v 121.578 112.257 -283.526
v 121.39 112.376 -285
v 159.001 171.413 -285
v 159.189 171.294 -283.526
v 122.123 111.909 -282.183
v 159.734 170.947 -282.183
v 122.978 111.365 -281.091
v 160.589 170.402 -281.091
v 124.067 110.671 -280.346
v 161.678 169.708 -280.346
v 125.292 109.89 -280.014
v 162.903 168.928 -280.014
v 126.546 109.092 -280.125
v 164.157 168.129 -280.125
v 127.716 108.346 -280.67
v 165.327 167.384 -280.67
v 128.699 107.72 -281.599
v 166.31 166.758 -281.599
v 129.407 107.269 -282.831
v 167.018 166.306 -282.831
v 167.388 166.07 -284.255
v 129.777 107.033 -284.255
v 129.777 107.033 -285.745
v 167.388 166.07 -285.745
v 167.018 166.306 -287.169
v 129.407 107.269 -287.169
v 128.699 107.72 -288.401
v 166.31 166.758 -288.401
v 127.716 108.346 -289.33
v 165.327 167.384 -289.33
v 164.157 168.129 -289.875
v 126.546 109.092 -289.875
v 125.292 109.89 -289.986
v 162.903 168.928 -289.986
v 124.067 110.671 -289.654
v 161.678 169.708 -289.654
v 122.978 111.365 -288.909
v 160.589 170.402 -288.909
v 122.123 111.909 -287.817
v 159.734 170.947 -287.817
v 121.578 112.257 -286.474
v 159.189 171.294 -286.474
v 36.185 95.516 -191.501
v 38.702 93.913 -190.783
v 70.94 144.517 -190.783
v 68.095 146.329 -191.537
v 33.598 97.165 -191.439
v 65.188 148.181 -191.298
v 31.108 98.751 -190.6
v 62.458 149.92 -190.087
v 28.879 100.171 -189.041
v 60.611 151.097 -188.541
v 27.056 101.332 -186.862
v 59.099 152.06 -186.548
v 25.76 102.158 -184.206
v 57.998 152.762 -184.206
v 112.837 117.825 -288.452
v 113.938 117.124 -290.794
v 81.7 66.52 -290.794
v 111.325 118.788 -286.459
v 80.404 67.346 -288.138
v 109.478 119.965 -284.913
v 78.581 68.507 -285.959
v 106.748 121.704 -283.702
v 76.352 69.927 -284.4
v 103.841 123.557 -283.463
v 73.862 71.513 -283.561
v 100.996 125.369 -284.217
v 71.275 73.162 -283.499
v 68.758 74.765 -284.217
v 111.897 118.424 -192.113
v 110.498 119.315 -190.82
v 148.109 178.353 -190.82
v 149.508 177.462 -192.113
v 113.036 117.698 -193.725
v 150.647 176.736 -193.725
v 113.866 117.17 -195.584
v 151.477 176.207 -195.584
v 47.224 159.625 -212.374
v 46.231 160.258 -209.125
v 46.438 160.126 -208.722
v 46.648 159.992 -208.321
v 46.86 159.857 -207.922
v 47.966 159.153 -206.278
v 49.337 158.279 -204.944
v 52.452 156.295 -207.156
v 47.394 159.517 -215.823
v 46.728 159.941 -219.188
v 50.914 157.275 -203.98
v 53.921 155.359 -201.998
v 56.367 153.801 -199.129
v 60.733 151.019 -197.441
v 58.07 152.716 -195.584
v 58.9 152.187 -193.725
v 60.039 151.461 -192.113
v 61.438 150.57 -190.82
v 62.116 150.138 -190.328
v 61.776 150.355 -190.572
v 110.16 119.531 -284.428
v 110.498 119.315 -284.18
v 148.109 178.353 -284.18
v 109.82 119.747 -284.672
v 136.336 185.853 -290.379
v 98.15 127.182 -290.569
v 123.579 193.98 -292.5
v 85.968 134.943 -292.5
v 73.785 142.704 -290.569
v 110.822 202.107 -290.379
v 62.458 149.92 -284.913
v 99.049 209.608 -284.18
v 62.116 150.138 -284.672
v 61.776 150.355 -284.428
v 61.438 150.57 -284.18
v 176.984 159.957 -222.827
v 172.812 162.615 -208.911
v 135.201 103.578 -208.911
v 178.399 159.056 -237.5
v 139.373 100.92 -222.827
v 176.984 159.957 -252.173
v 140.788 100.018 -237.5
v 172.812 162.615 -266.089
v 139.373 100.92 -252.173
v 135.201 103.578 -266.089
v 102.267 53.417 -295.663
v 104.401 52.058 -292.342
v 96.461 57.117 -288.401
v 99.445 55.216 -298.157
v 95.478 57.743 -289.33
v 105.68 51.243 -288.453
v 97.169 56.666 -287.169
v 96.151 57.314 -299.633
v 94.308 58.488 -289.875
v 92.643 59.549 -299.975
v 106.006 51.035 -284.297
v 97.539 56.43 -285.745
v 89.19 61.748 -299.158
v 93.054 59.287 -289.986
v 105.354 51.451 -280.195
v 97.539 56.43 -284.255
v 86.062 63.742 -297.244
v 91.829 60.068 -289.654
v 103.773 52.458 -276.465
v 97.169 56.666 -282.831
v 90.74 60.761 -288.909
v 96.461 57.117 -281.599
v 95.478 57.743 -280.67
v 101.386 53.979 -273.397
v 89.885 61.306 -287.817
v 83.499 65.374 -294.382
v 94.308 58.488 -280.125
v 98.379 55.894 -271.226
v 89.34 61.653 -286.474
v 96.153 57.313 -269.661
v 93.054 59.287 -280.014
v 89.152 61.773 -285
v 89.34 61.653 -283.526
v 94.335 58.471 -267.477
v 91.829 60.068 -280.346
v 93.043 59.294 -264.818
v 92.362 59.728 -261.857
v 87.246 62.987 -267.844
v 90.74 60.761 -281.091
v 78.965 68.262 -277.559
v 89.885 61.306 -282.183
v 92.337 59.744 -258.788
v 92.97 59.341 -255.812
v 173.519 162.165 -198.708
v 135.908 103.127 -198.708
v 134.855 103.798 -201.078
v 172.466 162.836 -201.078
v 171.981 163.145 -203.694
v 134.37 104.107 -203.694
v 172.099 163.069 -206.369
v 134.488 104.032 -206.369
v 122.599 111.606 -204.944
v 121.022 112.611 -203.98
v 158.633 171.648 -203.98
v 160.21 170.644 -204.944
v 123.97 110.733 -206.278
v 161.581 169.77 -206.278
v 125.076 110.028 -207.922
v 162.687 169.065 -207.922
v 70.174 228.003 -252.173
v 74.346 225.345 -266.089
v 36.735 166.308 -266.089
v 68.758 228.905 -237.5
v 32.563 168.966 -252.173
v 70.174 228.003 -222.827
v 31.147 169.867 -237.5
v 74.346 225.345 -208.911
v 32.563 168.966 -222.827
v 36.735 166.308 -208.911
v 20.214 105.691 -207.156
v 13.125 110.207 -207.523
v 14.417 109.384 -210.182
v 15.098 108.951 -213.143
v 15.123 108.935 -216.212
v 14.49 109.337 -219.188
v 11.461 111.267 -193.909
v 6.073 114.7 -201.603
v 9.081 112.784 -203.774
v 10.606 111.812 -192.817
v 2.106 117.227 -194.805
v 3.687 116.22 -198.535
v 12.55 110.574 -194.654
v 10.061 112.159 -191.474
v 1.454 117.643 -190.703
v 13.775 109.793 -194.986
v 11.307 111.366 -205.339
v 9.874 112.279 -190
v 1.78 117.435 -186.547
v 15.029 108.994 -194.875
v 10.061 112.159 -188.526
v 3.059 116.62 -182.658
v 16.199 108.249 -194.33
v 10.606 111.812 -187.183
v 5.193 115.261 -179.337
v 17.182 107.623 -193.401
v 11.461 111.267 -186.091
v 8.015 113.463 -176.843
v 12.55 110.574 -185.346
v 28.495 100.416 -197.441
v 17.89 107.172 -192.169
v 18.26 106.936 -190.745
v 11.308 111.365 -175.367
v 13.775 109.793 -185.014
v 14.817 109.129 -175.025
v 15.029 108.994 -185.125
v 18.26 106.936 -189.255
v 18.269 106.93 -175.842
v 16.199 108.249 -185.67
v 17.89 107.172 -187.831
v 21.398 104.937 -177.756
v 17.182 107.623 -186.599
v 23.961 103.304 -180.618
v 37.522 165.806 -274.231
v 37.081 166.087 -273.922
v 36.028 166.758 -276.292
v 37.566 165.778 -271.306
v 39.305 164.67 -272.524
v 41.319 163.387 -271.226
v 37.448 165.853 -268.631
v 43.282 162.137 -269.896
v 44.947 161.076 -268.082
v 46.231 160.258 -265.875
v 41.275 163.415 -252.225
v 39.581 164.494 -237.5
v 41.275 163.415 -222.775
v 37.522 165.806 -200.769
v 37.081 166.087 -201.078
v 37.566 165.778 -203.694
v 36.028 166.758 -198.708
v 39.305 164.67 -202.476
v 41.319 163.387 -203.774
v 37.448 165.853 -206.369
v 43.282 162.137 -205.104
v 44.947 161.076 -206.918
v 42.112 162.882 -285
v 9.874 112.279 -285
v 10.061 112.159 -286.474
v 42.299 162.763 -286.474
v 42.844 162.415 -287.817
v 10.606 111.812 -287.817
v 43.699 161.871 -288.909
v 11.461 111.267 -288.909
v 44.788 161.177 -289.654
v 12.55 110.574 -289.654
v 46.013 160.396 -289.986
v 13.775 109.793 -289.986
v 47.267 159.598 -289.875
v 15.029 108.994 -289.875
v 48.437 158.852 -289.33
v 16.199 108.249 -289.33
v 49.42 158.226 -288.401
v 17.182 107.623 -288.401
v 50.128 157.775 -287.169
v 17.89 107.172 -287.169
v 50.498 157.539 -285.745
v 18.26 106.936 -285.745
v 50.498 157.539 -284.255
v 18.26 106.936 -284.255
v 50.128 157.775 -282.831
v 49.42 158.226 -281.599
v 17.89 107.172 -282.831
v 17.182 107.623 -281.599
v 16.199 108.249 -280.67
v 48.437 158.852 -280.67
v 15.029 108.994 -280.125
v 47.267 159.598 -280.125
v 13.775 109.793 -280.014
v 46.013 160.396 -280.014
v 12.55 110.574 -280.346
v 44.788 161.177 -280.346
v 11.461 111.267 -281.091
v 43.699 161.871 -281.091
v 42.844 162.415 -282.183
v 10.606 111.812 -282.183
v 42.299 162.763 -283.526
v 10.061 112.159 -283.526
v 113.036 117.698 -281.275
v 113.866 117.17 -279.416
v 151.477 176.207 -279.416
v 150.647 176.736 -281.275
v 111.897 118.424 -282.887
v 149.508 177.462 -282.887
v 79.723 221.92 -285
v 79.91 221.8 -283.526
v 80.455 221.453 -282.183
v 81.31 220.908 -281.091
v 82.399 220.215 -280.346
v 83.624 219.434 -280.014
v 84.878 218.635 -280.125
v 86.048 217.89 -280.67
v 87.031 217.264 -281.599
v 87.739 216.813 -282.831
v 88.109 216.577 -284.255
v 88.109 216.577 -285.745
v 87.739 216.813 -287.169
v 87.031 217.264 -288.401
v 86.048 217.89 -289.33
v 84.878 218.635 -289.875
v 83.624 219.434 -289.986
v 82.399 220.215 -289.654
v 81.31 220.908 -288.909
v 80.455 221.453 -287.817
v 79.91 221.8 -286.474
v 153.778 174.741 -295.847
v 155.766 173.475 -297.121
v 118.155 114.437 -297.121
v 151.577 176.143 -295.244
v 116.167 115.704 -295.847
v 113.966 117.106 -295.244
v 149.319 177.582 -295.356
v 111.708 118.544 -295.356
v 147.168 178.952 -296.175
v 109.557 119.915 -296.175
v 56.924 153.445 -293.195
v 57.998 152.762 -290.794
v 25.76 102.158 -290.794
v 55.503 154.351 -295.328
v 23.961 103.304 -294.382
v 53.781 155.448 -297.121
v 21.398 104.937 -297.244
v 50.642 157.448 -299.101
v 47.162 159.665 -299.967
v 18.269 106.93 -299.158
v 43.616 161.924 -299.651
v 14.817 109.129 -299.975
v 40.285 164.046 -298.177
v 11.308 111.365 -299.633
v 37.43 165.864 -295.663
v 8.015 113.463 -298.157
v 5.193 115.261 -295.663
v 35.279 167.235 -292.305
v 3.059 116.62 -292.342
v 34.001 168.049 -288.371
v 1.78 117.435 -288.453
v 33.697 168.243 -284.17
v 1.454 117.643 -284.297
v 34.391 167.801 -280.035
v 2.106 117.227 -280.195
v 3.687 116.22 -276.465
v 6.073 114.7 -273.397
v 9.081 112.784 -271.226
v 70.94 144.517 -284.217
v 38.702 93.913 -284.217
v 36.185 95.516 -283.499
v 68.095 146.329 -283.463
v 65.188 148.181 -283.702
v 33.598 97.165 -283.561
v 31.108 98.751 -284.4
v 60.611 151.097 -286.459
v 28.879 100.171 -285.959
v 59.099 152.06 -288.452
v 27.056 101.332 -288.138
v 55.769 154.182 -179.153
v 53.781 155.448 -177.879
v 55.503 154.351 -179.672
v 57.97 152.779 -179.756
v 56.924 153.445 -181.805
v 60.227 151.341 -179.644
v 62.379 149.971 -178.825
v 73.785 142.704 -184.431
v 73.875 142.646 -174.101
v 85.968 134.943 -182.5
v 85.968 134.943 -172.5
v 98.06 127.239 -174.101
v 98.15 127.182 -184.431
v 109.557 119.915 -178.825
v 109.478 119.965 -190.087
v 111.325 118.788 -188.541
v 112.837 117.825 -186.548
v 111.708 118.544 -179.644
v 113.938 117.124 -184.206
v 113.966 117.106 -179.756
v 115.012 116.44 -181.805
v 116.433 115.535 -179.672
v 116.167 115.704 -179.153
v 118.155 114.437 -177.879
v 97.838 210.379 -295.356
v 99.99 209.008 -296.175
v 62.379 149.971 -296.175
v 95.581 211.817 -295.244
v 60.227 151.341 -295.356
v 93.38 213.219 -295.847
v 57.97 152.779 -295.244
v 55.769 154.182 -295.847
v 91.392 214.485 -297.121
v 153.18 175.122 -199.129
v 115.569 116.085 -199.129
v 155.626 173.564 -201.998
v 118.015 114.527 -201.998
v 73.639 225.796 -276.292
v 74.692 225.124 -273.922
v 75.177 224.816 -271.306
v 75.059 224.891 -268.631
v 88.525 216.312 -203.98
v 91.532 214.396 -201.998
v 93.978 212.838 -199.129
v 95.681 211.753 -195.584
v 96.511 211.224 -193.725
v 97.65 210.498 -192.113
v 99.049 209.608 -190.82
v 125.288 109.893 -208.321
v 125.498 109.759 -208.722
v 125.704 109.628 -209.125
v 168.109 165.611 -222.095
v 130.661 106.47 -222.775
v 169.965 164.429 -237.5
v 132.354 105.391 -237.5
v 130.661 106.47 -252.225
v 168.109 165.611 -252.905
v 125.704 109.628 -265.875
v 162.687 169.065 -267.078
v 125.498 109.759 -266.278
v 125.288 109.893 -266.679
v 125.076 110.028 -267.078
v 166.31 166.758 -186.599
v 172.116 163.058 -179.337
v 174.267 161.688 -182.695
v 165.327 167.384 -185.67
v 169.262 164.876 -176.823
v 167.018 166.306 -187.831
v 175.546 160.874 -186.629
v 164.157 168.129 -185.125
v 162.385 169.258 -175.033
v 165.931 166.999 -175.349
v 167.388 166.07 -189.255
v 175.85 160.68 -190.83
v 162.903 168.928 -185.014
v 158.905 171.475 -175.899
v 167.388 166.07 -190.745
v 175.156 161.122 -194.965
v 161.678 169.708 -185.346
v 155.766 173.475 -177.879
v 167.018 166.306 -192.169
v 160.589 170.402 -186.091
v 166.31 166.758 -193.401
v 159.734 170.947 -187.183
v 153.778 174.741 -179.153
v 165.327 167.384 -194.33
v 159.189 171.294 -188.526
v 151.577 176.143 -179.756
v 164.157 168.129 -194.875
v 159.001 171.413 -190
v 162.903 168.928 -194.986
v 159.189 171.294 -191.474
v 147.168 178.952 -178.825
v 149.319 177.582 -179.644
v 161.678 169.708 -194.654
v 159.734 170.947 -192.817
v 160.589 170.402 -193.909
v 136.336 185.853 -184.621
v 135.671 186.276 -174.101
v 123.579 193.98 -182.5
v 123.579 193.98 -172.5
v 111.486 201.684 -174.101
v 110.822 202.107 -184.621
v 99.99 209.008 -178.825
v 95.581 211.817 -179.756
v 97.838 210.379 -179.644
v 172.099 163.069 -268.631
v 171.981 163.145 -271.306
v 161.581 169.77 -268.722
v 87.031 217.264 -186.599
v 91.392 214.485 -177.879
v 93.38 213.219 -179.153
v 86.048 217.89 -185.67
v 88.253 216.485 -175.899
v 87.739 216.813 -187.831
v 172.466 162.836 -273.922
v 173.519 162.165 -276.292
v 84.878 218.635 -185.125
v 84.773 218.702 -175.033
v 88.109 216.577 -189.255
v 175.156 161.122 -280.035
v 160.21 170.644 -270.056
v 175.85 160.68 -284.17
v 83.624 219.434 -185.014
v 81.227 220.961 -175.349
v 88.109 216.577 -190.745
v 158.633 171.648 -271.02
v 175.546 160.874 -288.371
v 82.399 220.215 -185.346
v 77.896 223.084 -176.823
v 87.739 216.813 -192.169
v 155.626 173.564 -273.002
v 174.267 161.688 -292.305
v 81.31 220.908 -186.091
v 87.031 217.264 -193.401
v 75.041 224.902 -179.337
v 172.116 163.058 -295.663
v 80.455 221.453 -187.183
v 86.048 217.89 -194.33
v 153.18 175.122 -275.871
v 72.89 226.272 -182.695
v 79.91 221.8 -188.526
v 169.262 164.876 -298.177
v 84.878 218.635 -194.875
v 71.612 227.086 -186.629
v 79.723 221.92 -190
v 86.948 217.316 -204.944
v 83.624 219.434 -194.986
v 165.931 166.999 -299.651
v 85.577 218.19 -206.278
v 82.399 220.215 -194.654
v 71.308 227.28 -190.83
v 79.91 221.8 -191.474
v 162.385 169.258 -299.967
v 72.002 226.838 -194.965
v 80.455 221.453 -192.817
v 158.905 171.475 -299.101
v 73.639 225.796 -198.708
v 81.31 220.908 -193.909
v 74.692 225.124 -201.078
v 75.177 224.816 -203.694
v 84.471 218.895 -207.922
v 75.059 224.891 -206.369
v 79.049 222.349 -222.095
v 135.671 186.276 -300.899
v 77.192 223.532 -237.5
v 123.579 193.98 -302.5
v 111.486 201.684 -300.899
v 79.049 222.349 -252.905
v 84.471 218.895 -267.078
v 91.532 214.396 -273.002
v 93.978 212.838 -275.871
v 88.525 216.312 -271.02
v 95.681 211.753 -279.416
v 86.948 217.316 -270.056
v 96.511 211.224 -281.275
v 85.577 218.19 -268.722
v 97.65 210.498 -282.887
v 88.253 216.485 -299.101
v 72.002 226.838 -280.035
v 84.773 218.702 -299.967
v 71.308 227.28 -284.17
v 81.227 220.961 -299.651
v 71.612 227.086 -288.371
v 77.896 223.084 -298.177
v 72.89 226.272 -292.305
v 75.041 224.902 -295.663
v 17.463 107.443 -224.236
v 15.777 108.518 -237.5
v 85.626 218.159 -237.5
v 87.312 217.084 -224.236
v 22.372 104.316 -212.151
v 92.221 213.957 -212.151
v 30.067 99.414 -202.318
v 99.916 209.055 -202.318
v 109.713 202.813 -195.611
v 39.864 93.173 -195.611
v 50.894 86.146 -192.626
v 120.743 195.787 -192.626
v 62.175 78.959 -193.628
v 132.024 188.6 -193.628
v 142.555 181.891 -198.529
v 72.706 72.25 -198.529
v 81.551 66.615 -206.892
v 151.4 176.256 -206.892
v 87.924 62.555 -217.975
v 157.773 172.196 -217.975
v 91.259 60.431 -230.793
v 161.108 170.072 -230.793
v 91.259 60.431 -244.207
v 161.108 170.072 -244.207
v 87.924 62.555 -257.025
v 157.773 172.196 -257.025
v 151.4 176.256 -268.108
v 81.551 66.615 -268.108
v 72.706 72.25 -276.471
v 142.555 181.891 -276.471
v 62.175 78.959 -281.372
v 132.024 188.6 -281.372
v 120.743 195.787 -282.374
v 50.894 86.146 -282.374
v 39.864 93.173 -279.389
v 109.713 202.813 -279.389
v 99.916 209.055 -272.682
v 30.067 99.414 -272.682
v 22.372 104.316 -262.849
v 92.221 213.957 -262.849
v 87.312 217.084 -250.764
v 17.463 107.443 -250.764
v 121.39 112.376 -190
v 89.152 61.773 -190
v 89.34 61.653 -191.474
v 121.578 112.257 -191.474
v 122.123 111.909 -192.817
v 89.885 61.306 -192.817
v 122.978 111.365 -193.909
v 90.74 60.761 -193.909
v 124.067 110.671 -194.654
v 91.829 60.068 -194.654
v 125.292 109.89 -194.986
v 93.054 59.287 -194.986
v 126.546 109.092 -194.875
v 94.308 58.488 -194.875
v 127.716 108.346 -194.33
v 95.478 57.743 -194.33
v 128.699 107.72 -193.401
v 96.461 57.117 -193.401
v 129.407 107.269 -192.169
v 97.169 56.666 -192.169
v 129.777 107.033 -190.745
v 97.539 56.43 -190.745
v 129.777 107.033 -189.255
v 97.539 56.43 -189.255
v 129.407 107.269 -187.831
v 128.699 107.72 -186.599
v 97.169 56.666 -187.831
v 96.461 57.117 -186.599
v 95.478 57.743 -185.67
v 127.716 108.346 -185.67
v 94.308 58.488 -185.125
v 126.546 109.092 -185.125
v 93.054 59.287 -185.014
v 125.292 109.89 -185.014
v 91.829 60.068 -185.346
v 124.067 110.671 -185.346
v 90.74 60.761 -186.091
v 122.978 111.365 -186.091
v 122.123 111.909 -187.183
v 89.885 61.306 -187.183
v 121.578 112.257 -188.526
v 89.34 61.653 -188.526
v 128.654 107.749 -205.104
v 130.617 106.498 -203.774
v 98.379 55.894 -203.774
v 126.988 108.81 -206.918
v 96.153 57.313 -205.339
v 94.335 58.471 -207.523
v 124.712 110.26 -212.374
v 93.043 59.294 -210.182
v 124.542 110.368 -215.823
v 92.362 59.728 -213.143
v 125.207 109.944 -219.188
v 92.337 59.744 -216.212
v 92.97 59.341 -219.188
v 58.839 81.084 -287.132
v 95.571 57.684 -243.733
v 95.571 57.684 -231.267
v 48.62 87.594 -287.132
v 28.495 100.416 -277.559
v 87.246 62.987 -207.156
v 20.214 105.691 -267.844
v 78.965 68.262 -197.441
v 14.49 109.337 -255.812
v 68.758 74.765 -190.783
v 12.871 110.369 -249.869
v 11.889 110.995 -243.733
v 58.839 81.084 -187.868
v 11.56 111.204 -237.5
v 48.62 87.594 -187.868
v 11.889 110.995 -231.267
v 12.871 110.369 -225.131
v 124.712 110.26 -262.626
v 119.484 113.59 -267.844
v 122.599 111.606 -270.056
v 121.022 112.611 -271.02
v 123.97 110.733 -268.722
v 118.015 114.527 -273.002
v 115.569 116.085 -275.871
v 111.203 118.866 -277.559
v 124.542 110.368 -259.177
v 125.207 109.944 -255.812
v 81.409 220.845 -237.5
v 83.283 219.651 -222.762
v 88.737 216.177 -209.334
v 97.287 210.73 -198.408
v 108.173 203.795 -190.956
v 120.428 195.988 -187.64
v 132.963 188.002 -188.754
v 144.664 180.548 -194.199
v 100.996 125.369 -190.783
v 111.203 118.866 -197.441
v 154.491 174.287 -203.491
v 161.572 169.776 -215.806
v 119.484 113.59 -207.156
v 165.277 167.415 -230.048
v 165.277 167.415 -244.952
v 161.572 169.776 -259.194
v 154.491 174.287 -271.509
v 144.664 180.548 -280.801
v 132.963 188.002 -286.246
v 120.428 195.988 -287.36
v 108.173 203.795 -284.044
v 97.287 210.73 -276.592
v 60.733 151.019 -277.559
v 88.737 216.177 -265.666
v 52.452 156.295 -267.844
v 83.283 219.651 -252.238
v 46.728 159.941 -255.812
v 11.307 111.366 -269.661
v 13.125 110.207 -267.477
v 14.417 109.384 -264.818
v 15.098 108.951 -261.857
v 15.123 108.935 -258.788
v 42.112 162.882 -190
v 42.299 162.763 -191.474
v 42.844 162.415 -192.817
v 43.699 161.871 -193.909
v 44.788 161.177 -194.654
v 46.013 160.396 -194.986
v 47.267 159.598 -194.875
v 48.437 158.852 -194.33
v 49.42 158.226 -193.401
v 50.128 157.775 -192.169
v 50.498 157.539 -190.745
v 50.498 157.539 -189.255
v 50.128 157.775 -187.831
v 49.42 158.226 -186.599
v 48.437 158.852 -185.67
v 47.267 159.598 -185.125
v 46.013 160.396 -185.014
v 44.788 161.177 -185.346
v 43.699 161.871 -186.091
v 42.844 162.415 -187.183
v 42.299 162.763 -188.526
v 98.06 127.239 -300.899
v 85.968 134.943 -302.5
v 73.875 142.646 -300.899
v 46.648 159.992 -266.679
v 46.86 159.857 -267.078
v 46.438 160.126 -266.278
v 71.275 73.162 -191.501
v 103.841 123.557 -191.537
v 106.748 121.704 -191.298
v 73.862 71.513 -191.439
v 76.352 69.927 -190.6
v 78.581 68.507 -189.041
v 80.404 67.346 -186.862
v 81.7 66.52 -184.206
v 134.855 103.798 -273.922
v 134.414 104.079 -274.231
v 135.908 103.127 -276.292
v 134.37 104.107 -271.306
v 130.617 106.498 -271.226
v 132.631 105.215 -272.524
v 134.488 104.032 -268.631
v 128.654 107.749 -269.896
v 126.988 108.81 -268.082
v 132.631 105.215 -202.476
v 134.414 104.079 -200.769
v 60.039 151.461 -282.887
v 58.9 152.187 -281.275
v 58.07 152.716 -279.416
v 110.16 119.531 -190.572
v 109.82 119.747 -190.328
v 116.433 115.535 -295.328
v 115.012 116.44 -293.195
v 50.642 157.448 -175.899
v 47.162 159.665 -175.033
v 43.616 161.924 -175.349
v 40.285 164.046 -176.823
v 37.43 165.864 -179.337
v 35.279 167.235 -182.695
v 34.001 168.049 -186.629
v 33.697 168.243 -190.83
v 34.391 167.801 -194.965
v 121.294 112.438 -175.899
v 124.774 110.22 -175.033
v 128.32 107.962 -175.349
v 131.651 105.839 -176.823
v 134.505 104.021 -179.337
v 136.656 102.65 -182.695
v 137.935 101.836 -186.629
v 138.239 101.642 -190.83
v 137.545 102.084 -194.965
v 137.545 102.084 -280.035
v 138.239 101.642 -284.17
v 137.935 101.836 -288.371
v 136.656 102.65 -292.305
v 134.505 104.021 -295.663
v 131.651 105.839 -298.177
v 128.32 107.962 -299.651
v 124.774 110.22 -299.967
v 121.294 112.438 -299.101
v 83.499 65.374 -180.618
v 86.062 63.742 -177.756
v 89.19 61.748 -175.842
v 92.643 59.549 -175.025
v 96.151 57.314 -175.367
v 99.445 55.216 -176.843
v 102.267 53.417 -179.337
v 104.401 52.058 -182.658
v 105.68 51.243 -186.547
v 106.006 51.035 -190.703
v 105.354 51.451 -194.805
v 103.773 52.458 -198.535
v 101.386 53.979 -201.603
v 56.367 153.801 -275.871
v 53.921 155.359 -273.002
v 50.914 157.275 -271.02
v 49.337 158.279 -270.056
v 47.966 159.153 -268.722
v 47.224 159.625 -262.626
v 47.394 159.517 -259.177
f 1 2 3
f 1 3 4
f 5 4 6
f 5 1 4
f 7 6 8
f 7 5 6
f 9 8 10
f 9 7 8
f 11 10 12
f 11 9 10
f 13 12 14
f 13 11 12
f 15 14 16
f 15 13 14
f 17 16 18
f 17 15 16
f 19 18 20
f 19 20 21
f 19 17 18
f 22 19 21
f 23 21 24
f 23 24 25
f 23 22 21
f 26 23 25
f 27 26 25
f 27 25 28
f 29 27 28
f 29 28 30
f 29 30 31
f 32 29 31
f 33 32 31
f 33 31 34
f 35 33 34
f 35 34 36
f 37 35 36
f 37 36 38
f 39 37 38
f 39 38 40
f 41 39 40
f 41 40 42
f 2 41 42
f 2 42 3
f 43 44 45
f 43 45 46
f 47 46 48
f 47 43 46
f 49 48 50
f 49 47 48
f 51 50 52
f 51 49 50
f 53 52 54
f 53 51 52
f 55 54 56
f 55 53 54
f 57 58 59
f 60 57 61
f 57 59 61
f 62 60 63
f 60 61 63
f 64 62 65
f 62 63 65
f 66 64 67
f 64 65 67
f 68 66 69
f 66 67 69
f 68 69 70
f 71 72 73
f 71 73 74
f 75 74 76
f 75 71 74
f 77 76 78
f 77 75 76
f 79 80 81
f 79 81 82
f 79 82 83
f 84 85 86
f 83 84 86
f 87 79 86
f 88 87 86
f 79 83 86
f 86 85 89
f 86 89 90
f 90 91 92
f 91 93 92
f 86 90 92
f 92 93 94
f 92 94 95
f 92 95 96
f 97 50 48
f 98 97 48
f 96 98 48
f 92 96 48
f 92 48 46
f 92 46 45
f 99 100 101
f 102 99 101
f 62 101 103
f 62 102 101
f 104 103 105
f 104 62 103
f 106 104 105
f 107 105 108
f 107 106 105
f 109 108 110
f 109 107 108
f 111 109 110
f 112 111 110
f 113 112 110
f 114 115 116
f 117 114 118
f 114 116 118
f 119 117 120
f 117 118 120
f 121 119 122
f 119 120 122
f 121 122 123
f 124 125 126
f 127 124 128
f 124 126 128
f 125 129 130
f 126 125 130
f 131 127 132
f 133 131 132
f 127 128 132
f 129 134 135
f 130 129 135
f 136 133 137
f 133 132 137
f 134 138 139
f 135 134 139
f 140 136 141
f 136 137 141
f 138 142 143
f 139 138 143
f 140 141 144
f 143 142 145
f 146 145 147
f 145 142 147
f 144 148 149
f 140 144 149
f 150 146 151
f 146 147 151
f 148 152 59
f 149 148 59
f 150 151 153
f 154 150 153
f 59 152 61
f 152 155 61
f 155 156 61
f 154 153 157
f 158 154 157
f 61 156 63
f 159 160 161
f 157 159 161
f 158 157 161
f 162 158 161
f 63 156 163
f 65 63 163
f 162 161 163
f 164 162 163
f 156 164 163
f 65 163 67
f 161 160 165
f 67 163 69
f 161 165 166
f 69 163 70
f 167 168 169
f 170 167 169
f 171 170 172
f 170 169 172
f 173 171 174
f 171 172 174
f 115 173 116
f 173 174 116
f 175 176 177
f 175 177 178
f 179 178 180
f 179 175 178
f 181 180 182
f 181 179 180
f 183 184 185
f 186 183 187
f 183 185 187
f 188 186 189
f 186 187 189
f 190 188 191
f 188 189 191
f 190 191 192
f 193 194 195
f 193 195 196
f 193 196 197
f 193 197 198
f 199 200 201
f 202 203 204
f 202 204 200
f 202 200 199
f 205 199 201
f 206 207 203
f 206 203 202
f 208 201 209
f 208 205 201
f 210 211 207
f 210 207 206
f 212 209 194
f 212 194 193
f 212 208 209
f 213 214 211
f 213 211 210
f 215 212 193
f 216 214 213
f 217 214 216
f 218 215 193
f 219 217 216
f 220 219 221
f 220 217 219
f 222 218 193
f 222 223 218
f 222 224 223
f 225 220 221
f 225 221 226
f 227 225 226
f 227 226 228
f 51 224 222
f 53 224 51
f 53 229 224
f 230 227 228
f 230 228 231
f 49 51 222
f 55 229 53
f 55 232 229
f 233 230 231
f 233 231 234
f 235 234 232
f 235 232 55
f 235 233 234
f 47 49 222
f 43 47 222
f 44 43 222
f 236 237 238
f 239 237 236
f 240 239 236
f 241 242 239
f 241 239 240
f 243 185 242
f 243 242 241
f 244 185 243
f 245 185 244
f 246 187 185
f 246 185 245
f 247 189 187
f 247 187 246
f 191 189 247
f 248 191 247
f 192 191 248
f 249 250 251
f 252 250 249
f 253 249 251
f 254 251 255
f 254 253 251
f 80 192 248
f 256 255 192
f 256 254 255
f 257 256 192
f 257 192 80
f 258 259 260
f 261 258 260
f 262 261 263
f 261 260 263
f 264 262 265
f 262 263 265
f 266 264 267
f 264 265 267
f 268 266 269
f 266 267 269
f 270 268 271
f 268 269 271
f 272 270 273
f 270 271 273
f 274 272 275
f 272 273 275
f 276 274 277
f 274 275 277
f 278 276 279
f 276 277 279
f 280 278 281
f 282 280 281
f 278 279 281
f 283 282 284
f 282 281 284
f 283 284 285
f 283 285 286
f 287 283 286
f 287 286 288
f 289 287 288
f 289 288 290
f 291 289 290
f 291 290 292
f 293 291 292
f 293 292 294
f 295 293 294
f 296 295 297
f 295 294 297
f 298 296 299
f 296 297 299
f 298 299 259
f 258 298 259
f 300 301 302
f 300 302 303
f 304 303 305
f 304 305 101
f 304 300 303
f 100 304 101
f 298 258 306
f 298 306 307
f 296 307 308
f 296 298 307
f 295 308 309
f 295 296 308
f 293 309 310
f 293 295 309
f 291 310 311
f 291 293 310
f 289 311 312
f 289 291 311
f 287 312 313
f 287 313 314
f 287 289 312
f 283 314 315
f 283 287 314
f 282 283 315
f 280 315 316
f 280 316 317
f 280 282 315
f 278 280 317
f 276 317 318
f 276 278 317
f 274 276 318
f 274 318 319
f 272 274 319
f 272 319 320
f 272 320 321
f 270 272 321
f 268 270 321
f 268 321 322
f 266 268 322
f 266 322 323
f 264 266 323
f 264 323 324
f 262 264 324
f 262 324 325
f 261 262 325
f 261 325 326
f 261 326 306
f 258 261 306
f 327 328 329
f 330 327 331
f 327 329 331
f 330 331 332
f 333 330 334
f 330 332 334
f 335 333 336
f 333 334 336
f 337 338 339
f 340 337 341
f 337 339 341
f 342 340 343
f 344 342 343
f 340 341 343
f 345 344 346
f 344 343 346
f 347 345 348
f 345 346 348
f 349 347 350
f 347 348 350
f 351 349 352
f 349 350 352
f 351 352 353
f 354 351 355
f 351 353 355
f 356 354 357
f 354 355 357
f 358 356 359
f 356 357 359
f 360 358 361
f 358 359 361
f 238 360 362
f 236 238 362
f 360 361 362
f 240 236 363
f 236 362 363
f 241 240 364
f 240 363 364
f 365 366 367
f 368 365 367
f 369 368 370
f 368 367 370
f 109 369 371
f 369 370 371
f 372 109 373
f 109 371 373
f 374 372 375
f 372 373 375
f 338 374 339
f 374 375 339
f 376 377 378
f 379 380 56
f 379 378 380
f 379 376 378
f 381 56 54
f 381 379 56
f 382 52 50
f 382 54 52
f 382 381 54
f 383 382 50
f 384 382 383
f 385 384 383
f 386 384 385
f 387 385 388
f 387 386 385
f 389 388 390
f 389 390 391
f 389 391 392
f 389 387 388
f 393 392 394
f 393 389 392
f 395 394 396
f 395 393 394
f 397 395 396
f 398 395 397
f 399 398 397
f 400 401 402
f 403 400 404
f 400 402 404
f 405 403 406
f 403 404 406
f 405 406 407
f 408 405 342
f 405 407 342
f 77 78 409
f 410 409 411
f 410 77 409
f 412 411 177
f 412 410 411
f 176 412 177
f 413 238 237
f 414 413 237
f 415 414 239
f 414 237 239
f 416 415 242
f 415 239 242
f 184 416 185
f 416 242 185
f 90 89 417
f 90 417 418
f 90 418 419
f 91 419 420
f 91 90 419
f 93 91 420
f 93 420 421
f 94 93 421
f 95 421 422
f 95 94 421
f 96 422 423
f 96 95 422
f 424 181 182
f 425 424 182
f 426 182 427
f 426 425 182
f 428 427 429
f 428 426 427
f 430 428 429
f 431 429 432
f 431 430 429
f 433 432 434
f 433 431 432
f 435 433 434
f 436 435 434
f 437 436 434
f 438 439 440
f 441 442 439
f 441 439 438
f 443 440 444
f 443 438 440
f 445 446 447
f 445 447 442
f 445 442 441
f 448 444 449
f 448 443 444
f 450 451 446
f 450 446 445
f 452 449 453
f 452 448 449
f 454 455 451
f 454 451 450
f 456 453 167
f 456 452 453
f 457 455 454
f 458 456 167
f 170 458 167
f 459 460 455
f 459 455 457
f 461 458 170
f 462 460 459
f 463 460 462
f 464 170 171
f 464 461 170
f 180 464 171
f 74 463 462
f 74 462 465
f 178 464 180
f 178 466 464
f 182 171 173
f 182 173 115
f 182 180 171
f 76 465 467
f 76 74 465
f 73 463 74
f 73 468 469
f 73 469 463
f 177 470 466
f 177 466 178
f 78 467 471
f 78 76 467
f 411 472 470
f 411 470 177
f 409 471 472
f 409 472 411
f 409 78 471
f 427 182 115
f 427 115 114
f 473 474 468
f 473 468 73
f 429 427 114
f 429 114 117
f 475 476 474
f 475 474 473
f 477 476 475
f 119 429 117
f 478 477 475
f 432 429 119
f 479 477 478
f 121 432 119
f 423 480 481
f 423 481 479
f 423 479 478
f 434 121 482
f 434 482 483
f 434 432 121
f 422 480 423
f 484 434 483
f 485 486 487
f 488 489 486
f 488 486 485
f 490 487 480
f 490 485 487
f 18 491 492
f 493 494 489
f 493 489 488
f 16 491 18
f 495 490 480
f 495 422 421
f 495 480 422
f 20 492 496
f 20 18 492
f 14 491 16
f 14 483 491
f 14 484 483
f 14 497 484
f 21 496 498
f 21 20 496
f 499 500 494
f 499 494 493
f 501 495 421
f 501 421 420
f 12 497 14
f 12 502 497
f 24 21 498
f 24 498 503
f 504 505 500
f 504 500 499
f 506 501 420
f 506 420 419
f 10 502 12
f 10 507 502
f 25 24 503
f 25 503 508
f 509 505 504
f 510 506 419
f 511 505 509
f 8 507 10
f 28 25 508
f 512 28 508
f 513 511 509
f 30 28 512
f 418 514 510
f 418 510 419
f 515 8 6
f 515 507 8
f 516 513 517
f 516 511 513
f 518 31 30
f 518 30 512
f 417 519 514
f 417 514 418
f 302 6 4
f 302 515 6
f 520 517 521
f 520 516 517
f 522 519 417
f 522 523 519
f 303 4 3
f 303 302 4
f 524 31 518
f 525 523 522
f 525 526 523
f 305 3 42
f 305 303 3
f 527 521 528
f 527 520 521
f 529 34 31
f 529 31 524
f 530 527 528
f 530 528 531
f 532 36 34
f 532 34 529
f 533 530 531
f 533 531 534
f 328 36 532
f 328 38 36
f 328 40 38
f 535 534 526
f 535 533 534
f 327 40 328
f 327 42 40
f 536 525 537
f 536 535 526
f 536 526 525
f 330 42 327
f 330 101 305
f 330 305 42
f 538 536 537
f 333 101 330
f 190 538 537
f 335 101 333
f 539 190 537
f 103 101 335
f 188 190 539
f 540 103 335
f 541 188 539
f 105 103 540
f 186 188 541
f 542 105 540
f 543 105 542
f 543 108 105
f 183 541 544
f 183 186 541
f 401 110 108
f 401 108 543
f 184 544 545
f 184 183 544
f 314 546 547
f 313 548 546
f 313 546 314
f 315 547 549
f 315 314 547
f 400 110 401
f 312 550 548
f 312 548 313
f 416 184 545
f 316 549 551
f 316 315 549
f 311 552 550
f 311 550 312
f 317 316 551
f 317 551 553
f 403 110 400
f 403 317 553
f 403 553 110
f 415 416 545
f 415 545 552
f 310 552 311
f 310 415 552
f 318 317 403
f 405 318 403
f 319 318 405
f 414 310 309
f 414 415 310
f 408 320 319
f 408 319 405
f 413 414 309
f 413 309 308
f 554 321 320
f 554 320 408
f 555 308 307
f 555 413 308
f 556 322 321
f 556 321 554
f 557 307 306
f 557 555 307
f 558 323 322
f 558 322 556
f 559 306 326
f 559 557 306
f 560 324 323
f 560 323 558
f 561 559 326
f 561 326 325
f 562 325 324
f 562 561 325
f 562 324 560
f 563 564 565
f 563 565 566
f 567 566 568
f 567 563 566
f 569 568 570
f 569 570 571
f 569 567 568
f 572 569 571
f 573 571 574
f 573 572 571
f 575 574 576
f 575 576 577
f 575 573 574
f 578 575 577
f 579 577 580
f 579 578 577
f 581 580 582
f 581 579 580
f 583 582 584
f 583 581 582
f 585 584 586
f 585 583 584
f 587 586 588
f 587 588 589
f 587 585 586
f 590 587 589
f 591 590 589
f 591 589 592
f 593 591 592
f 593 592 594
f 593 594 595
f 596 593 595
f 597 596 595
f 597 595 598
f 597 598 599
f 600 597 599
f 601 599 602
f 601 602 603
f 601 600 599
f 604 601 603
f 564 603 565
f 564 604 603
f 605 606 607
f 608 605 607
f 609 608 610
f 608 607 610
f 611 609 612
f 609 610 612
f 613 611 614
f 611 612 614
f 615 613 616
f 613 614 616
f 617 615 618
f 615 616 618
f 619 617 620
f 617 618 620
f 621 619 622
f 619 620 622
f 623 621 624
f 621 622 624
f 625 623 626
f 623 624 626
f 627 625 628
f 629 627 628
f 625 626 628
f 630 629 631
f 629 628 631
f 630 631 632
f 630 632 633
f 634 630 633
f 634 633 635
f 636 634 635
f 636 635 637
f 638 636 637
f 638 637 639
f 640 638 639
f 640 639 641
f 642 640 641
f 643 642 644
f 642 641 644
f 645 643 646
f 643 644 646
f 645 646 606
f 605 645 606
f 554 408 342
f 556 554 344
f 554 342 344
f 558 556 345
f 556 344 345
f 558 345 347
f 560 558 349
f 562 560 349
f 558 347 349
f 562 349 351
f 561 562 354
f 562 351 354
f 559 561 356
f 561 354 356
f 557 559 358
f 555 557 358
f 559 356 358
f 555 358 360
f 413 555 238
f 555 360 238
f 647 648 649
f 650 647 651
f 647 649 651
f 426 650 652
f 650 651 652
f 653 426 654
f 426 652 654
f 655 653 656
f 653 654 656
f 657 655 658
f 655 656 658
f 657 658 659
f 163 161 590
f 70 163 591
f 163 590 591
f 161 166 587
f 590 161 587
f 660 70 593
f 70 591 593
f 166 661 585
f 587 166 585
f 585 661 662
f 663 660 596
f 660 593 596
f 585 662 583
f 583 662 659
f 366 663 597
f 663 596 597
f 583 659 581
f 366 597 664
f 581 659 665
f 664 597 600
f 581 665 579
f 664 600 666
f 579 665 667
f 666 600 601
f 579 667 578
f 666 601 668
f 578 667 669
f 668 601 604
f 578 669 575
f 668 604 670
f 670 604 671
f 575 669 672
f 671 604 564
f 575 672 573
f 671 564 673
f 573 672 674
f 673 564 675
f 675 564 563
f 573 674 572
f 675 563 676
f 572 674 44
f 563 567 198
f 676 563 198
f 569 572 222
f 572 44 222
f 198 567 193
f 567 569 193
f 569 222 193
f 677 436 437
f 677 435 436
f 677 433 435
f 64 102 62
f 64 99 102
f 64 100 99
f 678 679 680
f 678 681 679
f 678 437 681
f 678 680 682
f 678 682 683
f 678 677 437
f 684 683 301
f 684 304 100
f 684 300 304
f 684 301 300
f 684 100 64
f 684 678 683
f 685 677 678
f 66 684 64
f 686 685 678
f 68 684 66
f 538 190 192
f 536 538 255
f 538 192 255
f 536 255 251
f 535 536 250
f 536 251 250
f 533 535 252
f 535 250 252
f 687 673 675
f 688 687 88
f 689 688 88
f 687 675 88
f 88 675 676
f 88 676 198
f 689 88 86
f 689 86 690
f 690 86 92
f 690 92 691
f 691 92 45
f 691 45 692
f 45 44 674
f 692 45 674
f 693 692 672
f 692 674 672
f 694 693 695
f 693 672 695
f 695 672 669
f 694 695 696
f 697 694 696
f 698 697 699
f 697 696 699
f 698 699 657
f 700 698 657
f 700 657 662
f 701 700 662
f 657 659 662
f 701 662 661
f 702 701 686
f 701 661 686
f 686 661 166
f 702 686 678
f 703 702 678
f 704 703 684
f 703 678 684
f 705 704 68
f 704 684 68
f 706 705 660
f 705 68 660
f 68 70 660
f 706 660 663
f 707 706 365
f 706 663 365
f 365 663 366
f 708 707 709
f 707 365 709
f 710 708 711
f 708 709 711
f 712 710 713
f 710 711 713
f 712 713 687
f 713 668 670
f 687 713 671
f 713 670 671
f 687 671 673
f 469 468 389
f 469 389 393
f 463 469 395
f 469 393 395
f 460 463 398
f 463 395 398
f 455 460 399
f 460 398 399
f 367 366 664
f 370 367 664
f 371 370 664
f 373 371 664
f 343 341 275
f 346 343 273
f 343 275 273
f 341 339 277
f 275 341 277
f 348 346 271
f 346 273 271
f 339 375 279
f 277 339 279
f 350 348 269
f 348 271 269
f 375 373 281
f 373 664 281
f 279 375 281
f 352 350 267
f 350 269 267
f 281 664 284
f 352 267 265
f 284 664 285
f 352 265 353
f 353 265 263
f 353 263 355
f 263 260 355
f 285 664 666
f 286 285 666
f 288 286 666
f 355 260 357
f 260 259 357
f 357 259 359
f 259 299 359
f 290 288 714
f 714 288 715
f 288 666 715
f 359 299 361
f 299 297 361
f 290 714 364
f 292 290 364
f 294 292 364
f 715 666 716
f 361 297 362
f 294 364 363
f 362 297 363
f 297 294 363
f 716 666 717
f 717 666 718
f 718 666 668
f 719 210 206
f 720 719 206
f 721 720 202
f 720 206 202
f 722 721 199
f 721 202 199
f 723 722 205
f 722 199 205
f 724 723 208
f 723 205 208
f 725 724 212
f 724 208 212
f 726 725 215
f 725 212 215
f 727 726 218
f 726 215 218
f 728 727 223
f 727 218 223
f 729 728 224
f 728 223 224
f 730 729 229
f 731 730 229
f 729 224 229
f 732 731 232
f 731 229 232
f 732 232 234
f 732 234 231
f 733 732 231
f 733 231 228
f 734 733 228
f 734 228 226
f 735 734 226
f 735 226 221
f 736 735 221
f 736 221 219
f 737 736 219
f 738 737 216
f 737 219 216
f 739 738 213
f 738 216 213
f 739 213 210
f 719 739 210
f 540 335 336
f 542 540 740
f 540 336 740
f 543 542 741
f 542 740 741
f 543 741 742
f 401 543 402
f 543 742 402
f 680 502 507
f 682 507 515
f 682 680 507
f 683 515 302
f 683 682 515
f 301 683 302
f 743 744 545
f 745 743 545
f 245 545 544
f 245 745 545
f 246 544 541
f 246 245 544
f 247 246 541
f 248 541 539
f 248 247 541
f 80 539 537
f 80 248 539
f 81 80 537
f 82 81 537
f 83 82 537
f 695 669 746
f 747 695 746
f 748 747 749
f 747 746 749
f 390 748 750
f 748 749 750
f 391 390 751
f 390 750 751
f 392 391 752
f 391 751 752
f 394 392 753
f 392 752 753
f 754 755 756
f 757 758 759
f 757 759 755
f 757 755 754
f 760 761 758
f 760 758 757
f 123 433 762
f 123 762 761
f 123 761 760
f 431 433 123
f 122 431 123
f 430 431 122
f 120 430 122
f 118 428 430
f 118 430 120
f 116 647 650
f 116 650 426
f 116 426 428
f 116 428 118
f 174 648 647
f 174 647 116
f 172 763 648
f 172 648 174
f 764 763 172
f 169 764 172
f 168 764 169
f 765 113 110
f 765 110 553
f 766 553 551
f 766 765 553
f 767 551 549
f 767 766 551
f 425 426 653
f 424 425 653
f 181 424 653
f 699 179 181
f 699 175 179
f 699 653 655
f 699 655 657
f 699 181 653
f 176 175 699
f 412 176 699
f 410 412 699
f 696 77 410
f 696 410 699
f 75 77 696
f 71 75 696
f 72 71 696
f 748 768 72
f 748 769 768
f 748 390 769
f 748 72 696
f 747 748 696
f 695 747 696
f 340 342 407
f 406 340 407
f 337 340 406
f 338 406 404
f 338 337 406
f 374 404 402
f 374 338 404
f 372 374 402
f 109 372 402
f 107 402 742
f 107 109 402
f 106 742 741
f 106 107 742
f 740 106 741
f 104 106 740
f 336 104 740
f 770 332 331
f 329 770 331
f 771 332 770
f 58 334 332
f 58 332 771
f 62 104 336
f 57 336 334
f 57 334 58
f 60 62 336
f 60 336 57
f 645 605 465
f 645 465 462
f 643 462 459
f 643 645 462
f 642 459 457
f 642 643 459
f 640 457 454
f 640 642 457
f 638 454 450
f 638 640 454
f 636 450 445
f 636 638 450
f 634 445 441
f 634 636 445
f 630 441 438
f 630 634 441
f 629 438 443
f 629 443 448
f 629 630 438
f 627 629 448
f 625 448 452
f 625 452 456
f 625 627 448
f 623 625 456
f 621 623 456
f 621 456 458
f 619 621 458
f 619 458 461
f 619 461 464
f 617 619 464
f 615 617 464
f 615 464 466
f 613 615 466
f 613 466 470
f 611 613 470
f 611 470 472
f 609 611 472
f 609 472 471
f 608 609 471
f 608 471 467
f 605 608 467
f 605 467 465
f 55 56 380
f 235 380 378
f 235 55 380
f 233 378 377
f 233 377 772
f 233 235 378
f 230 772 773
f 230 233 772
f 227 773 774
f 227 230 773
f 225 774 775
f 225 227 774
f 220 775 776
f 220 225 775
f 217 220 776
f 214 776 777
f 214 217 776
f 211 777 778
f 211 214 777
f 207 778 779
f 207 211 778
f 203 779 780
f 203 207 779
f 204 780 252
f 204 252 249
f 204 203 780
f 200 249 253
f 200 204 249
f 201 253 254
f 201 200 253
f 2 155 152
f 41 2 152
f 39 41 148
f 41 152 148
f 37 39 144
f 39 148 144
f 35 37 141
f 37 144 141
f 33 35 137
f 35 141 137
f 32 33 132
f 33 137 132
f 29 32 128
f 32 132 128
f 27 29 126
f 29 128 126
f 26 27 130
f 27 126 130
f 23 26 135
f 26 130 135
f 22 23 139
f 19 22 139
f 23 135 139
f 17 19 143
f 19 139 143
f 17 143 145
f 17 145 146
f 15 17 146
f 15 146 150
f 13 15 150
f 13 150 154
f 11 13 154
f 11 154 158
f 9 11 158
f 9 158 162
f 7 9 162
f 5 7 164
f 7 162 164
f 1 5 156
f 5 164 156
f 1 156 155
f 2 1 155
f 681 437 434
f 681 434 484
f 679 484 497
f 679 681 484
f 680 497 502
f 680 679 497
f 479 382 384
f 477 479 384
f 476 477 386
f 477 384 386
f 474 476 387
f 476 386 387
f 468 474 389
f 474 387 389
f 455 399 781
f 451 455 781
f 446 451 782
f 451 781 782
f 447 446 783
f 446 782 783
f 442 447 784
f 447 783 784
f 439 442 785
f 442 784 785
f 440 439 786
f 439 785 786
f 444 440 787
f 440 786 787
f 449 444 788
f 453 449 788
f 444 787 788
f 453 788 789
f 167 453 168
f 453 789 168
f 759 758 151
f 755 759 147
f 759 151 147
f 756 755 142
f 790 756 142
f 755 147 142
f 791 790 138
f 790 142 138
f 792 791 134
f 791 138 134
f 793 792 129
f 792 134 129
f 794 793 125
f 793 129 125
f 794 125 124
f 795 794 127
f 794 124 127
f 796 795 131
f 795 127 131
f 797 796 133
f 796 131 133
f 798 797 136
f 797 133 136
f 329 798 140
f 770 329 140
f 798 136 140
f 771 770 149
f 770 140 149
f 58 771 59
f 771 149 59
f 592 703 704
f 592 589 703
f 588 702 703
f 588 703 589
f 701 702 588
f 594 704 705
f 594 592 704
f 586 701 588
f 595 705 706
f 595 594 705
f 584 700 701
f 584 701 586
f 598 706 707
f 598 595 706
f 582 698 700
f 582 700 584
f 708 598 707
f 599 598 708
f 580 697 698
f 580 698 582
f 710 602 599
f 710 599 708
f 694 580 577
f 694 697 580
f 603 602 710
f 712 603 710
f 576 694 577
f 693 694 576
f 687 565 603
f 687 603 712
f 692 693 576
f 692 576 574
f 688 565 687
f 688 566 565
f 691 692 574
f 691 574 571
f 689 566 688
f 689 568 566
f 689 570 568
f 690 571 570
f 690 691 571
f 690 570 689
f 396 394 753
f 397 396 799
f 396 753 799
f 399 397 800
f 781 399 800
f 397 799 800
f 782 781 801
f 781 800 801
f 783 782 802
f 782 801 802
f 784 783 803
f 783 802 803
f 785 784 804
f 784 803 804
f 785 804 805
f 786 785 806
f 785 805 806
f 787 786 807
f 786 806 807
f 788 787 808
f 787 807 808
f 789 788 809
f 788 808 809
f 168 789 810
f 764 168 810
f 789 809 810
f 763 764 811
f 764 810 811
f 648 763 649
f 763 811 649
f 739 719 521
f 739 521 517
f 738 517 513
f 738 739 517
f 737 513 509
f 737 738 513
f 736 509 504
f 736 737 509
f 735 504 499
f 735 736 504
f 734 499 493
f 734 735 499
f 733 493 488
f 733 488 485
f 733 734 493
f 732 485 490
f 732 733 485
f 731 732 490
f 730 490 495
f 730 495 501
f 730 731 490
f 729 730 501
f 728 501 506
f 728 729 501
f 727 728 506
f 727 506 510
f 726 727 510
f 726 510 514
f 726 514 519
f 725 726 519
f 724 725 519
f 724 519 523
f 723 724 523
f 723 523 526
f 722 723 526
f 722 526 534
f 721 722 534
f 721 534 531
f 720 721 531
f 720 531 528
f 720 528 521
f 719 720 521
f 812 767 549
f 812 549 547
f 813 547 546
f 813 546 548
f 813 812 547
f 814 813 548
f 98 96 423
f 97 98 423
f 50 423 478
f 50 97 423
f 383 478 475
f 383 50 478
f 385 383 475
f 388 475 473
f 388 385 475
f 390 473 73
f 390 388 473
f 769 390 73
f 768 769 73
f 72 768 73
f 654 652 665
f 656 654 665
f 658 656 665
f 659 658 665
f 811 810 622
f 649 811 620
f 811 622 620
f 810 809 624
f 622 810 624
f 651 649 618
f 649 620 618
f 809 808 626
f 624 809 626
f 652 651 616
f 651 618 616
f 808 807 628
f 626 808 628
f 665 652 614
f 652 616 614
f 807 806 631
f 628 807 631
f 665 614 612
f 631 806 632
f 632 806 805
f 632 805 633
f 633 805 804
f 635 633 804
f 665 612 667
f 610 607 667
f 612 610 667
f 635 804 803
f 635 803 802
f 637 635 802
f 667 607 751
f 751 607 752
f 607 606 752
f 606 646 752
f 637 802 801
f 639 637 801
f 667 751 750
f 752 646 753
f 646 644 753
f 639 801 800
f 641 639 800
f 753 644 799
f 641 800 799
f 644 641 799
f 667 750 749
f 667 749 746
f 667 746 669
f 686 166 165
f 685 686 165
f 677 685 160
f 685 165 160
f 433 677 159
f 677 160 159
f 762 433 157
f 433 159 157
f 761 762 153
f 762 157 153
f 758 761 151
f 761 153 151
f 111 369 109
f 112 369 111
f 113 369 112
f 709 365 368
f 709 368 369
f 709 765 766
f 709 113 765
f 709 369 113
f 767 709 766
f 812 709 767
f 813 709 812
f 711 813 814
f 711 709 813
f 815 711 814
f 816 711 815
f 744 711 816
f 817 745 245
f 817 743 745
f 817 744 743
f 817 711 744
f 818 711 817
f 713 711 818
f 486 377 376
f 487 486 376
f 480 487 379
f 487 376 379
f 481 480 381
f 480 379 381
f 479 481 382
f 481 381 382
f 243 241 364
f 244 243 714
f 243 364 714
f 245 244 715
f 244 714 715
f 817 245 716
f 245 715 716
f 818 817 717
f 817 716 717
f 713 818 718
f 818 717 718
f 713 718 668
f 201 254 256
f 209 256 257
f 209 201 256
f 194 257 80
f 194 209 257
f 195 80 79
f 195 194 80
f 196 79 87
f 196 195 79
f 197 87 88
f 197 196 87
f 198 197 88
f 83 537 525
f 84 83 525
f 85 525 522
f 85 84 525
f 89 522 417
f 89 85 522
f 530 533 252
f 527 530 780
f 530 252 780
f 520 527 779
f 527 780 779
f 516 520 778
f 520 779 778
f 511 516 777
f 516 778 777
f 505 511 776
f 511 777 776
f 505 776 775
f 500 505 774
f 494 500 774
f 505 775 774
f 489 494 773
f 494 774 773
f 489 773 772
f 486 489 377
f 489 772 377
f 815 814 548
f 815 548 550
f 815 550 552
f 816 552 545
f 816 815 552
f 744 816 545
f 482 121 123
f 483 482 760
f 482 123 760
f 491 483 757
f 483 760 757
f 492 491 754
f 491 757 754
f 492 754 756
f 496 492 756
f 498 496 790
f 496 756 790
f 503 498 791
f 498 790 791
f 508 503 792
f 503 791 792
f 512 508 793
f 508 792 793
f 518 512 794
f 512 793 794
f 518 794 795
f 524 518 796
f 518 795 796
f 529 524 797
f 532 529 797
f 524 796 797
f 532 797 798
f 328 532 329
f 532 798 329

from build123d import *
from build123d.topology import SkipClean

# Parameters (mm, degrees)
BOSS_EXTRUDE1_START   = 100
SKETCH2_R             = 5
BOSS_EXTRUDE1_DEPTH   = 130
SKETCH2_R_2           = 50
SKETCH2_R_3           = 45
BOSS_EXTRUDE1_2_DEPTH = 130
SKETCH3_R             = 100
SKETCH3_R_2           = 50
CUT_EXTRUDE1_DEPTH    = 60
BOSS_EXTRUDE3_START   = 60
SKETCH4_R             = 5
BOSS_EXTRUDE3_DEPTH   = 60


with BuildPart() as part:
    # Sketch2 → Boss-Extrude1 (new body)
    with BuildSketch(Plane(origin=(0, 0, 0), x_dir=(0, 0, -1), z_dir=(0.5372996083468277, 0.8433914458128833, 0)).offset(BOSS_EXTRUDE1_START)):
        with BuildLine():
            ThreePointArc((198.707774346, 59.213708116), (179.337427943, 57.550334456), (177.879118885, 38.163471214))
            ThreePointArc((177.879118885, 38.163471214), (179.755724079, 33.196743881), (178.825393945, 27.96945842))
            ThreePointArc((178.825393945, 27.96945842), (172.5, 0), (178.825393945, -27.96945842))
            ThreePointArc((178.825393945, -27.96945842), (179.755724079, -33.196743881), (177.879118885, -38.163471214))
            ThreePointArc((177.879118885, -38.163471214), (179.337427943, -57.550334456), (198.707774346, -59.213708116))
            ThreePointArc((198.707774346, -59.213708116), (203.694081302, -57.389764479), (208.911229611, -58.375356167))
            ThreePointArc((208.911229611, -58.375356167), (237.5, -65), (266.088770389, -58.375356167))
            ThreePointArc((266.088770389, -58.375356167), (271.305918698, -57.389764479), (276.292225654, -59.213708116))
            ThreePointArc((276.292225654, -59.213708116), (295.662572057, -57.550334456), (297.120881115, -38.163471214))
            ThreePointArc((297.120881115, -38.163471214), (295.244275921, -33.196743881), (296.174606055, -27.96945842))
            ThreePointArc((296.174606055, -27.96945842), (302.5, 0), (296.174606055, 27.96945842))
            ThreePointArc((296.174606055, 27.96945842), (295.244275921, 33.196743881), (297.120881115, 38.163471214))
            ThreePointArc((297.120881115, 38.163471214), (295.662572057, 57.550334456), (276.292225654, 59.213708116))
            ThreePointArc((276.292225654, 59.213708116), (271.305918698, 57.389764479), (266.088770389, 58.375356167))
            ThreePointArc((266.088770389, 58.375356167), (237.5, 65), (208.911229611, 58.375356167))
            ThreePointArc((208.911229611, 58.375356167), (203.694081302, 57.389764479), (198.707774346, 59.213708116))
        make_face()
        with Locations(Location((190, -47, 0), (0, 0, 90))):
            Circle(SKETCH2_R, mode=Mode.SUBTRACT)
        with Locations(Location((285, -47, 0), (0, 0, 90))):
            Circle(SKETCH2_R, mode=Mode.SUBTRACT)
        with Locations(Location((190, 47, 0), (0, 0, 90))):
            Circle(SKETCH2_R, mode=Mode.SUBTRACT)
        with Locations(Location((285, 47, 0), (0, 0, 90))):
            Circle(SKETCH2_R, mode=Mode.SUBTRACT)
        with BuildLine():
            ThreePointArc((195.584219919, 33.078200982), (192.883806526, 31.461344995), (190.819707243, 29.085224223))
            ThreePointArc((190.819707243, 29.085224223), (182.5, 0), (190.819707243, -29.085224223))
            ThreePointArc((190.819707243, -29.085224223), (192.883806526, -31.461344995), (195.584219919, -33.078200982))
            ThreePointArc((195.584219919, -33.078200982), (200.662572057, -36.449665544), (203.980110186, -41.56340923))
            ThreePointArc((203.980110186, -41.56340923), (205.568300645, -44.280780541), (207.922446674, -46.369907691))
            ThreePointArc((207.922446674, -46.369907691), (237.5, -55), (267.077553326, -46.369907691))
            ThreePointArc((267.077553326, -46.369907691), (269.431699355, -44.280780541), (271.019889814, -41.56340923))
            ThreePointArc((271.019889814, -41.56340923), (274.337427943, -36.449665544), (279.415780081, -33.078200982))
            ThreePointArc((279.415780081, -33.078200982), (282.116193474, -31.461344995), (284.180292757, -29.085224223))
            ThreePointArc((284.180292757, -29.085224223), (292.5, 0), (284.180292757, 29.085224223))
            ThreePointArc((284.180292757, 29.085224223), (282.116193474, 31.461344995), (279.415780081, 33.078200982))
            ThreePointArc((279.415780081, 33.078200982), (274.337427943, 36.449665544), (271.019889814, 41.56340923))
            ThreePointArc((271.019889814, 41.56340923), (269.431699355, 44.280780541), (267.077553326, 46.369907691))
            ThreePointArc((267.077553326, 46.369907691), (237.5, 55), (207.922446674, 46.369907691))
            ThreePointArc((207.922446674, 46.369907691), (205.568300645, 44.280780541), (203.980110186, 41.56340923))
            ThreePointArc((203.980110186, 41.56340923), (200.662572057, 36.449665544), (195.584219919, 33.078200982))
        make_face(mode=Mode.SUBTRACT)
    extrude(amount=BOSS_EXTRUDE1_DEPTH)

    # Sketch3 → Cut-Extrude1 (cut)
    with BuildSketch(Plane(origin=(53.729960835, 84.339144581, 0), x_dir=(0.8433914458128833, -0.5372996083468277, 0), z_dir=(-0.5372996083468277, -0.8433914458128833, 0))):
        with Locations((0, -237.5)):
            Circle(SKETCH3_R)
        with Locations(Location((0, -237.5, 0), (0, 0, 180))):
            Circle(SKETCH3_R_2, mode=Mode.SUBTRACT)
    extrude(amount=-CUT_EXTRUDE1_DEPTH, mode=Mode.SUBTRACT)



with BuildPart() as body_2:
    # Sketch2 → Boss-Extrude1 2 (new body)
    with BuildSketch(Plane(origin=(0, 0, 0), x_dir=(0, 0, -1), z_dir=(0.5372996083468277, 0.8433914458128833, 0)).offset(BOSS_EXTRUDE1_START)):
        with Locations(Location((237.5, 0, 0), (0, 0, 90))):
            Circle(SKETCH2_R_2)
        with Locations(Location((237.5, 0, 0), (0, 0, 90))):
            Circle(SKETCH2_R_3, mode=Mode.SUBTRACT)
    extrude(amount=BOSS_EXTRUDE1_2_DEPTH)


with BuildPart() as part_1:
    with SkipClean():  # the faces are left unmerged after this step: merging them gives an invalid solid
        add(part.part)

        add(body_2.part)  # Boss-Extrude3 merges body 2
        # Sketch4 → Boss-Extrude3 (add)
        # profile 1 of 4: a face of its own
        with BuildSketch(Plane(origin=(85.967937335, 134.94263133, 0), x_dir=(0.8433914458128833, -0.5372996083468277, 0), z_dir=(-0.5372996083468277, -0.8433914458128833, 0)).offset(BOSS_EXTRUDE3_START)):
            with BuildLine():
                ThreePointArc((-33.164183333, -184.206022338), (-57.550334456, -179.337427943), (-52.940059929, -203.773731813))
                ThreePointArc((-52.940059929, -203.773731813), (-46.613065404, -210.182422478), (-46.525893445, -219.187675212))
                ThreePointArc((-46.525893445, -219.187675212), (-35.16778152, -201.958093144), (-17.818975805, -190.782935652))
                ThreePointArc((-17.818975805, -190.782935652), (-26.822801925, -190.600477562), (-33.164183333, -184.206022338))
            make_face()
            with Locations(Location((-47, -190, 0), (0, 0, 180))):
                Circle(SKETCH4_R, mode=Mode.SUBTRACT)
        # profile 2 of 4: a face of its own
        with BuildSketch(Plane(origin=(85.967937335, 134.94263133, 0), x_dir=(0.8433914458128833, -0.5372996083468277, 0), z_dir=(-0.5372996083468277, -0.8433914458128833, 0)).offset(BOSS_EXTRUDE3_START)):
            with BuildLine():
                ThreePointArc((17.818975805, -190.782935652), (26.822801925, -190.600477562), (33.164183333, -184.206022338))
                ThreePointArc((33.164183333, -184.206022338), (57.550334456, -179.337427943), (52.940059929, -203.773731813))
                ThreePointArc((52.940059929, -203.773731813), (46.613065404, -210.182422478), (46.525893445, -219.187675212))
                ThreePointArc((46.525893445, -219.187675212), (35.16778152, -201.958093144), (17.818975805, -190.782935652))
            make_face()
            with Locations(Location((47, -190, 0), (0, 0, 180))):
                Circle(SKETCH4_R, mode=Mode.SUBTRACT)
        # profile 3 of 4: a face of its own
        with BuildSketch(Plane(origin=(85.967937335, 134.94263133, 0), x_dir=(0.8433914458128833, -0.5372996083468277, 0), z_dir=(-0.5372996083468277, -0.8433914458128833, 0)).offset(BOSS_EXTRUDE3_START)):
            with BuildLine():
                ThreePointArc((17.818975805, -284.217064348), (35.16778152, -273.041906856), (46.525893445, -255.812324788))
                ThreePointArc((46.525893445, -255.812324788), (46.613065404, -264.817577522), (52.940059929, -271.226268187))
                ThreePointArc((52.940059929, -271.226268187), (57.550334456, -295.662572057), (33.164183333, -290.793977662))
                ThreePointArc((33.164183333, -290.793977662), (26.822801925, -284.399522438), (17.818975805, -284.217064348))
            make_face()
            with Locations(Location((47, -285, 0), (0, 0, 180))):
                Circle(SKETCH4_R, mode=Mode.SUBTRACT)
        # profile 4 of 4: a face of its own
        with BuildSketch(Plane(origin=(85.967937335, 134.94263133, 0), x_dir=(0.8433914458128833, -0.5372996083468277, 0), z_dir=(-0.5372996083468277, -0.8433914458128833, 0)).offset(BOSS_EXTRUDE3_START)):
            with BuildLine():
                ThreePointArc((-17.818975805, -284.217064348), (-26.822801925, -284.399522438), (-33.164183333, -290.793977662))
                ThreePointArc((-33.164183333, -290.793977662), (-57.550334456, -295.662572057), (-52.940059929, -271.226268187))
                ThreePointArc((-52.940059929, -271.226268187), (-46.613065404, -264.817577522), (-46.525893445, -255.812324788))
                ThreePointArc((-46.525893445, -255.812324788), (-35.16778152, -273.041906856), (-17.818975805, -284.217064348))
            make_face()
            with Locations(Location((-47, -285, 0), (0, 0, 180))):
                Circle(SKETCH4_R, mode=Mode.SUBTRACT)
        extrude(amount=-BOSS_EXTRUDE3_DEPTH)


solid = part_1.part
